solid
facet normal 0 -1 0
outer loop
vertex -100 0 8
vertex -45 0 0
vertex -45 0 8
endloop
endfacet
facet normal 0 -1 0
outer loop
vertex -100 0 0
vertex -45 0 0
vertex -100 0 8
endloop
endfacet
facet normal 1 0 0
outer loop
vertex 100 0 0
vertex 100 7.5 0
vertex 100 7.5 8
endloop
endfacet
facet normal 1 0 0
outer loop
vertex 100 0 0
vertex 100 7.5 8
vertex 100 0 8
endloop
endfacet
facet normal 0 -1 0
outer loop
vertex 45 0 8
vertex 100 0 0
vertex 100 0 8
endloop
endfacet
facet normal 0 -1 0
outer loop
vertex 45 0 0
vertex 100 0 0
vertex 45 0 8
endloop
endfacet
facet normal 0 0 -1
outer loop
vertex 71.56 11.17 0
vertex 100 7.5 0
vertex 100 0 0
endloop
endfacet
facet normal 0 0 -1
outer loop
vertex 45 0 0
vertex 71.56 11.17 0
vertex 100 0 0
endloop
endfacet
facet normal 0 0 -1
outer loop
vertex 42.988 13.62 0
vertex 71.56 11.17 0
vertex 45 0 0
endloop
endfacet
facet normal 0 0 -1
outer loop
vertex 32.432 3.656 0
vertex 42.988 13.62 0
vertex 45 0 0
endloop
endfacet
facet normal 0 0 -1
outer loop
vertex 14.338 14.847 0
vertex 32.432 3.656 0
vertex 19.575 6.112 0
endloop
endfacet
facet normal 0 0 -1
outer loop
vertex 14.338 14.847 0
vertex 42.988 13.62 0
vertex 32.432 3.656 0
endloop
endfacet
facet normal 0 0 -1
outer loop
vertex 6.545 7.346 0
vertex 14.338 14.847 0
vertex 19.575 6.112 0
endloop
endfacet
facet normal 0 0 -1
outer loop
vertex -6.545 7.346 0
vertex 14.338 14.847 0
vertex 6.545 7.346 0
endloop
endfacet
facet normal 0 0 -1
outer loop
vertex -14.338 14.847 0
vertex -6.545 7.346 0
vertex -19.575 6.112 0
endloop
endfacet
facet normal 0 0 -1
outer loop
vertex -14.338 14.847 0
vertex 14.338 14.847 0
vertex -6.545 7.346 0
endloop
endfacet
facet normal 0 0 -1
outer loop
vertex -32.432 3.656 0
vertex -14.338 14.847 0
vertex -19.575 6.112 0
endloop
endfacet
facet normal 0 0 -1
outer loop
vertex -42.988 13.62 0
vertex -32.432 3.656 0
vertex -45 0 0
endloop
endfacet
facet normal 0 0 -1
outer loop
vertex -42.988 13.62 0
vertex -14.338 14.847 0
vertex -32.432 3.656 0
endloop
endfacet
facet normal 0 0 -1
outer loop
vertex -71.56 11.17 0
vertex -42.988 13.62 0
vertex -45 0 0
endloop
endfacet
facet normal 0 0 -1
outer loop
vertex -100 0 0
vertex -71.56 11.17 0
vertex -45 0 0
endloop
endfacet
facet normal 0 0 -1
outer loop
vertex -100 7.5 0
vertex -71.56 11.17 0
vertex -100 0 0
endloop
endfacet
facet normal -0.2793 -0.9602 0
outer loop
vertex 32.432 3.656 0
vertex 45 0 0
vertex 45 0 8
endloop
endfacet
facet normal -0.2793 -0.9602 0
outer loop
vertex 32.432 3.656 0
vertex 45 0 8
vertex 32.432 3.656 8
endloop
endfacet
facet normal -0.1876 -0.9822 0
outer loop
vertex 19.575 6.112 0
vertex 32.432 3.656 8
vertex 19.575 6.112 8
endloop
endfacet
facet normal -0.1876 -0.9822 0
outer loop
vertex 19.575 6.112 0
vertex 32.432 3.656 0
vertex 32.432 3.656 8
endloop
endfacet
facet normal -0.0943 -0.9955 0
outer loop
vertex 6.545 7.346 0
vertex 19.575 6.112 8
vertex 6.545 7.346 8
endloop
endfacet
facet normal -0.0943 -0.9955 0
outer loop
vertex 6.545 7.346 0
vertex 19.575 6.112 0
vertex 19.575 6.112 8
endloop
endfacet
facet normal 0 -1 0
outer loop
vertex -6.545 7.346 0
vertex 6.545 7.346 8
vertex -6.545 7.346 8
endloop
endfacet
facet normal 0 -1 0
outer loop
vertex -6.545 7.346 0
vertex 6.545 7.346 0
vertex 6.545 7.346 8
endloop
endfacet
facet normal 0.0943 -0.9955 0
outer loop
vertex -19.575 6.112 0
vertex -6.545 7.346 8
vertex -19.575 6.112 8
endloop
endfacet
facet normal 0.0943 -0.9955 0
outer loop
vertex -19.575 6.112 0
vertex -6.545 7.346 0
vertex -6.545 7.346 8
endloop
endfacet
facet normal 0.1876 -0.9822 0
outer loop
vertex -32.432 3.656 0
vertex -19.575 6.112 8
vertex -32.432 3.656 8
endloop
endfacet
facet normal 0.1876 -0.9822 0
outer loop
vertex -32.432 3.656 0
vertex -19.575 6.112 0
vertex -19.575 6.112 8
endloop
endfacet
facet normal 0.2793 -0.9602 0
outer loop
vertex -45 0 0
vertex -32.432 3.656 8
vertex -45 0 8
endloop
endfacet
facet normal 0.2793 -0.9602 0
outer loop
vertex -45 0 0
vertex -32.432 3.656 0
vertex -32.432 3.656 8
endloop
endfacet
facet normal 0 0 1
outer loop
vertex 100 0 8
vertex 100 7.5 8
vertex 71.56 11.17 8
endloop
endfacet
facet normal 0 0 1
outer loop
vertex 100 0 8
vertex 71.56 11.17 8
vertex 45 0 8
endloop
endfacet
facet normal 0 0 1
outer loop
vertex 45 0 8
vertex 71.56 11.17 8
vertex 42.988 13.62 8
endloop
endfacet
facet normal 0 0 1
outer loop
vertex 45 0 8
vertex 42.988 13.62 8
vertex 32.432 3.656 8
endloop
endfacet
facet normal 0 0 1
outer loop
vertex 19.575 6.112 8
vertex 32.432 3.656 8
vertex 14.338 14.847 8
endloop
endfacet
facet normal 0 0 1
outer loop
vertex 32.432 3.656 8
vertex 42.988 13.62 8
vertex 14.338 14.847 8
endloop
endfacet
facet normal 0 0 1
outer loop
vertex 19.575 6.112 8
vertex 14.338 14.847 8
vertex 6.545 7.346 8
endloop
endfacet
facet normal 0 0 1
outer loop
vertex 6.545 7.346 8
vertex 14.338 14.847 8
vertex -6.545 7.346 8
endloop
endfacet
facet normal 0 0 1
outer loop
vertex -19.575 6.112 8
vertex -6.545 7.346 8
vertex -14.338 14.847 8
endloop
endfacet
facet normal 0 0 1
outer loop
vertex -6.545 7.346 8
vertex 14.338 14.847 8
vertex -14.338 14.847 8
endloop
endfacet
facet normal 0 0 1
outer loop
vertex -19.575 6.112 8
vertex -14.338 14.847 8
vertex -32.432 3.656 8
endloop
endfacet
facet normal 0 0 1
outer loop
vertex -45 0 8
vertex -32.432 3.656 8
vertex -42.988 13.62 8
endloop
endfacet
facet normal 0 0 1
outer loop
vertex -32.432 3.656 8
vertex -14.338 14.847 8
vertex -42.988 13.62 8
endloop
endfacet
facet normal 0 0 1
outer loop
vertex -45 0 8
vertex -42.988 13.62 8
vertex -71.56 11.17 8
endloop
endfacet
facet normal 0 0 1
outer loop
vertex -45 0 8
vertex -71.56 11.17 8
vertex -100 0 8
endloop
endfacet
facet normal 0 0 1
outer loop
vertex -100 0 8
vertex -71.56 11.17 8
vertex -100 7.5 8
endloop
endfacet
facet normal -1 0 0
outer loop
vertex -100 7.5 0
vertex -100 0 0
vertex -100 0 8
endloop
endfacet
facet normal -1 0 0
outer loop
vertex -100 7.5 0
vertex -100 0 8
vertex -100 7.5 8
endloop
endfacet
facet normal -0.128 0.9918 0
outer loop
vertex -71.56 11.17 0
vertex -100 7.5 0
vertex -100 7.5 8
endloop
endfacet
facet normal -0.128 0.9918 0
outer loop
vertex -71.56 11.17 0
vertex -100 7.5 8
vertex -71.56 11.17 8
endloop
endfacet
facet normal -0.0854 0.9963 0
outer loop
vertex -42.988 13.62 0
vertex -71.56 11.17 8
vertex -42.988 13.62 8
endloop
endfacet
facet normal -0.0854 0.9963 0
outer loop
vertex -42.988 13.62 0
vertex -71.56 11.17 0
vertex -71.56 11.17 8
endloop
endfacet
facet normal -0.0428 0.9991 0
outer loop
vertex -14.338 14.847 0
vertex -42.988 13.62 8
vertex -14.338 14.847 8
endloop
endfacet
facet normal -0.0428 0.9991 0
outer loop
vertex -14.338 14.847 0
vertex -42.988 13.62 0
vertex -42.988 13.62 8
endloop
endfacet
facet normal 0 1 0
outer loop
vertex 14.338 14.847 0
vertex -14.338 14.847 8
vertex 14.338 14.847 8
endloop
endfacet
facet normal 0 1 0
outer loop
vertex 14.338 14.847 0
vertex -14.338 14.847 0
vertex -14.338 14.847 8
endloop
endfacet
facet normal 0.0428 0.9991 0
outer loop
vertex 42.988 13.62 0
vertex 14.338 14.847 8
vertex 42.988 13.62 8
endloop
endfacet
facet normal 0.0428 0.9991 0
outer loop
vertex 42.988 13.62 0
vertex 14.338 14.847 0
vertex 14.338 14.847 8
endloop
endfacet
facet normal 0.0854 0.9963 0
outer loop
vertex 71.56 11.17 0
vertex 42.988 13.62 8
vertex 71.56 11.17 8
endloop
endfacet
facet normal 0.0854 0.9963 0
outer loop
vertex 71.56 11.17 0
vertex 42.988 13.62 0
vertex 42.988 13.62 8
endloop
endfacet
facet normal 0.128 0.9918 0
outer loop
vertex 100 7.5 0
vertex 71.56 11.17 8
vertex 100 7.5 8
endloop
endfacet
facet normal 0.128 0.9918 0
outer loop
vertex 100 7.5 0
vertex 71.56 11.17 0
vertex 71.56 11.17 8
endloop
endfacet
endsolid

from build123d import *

# Parameters (mm, degrees)
BOSS_EXTRU_1_DEPTH = 8


with BuildPart() as part:
    # Esquisse1 → Boss.-Extru.1 (new body)
    with BuildSketch(Plane.XY):
        with BuildLine():
            Line((-100, 0), (-100, 7.5))
            ThreePointArc((-100, 7.5), (0, 15), (100, 7.5))
            Line((100, 7.5), (100, 0))
            Line((100, 0), (45, 0))
            ThreePointArc((45, 0), (0, 7.5), (-45, 0))
            Line((-45, 0), (-100, 0))
        make_face()
    extrude(amount=BOSS_EXTRU_1_DEPTH)


solid = part.part
